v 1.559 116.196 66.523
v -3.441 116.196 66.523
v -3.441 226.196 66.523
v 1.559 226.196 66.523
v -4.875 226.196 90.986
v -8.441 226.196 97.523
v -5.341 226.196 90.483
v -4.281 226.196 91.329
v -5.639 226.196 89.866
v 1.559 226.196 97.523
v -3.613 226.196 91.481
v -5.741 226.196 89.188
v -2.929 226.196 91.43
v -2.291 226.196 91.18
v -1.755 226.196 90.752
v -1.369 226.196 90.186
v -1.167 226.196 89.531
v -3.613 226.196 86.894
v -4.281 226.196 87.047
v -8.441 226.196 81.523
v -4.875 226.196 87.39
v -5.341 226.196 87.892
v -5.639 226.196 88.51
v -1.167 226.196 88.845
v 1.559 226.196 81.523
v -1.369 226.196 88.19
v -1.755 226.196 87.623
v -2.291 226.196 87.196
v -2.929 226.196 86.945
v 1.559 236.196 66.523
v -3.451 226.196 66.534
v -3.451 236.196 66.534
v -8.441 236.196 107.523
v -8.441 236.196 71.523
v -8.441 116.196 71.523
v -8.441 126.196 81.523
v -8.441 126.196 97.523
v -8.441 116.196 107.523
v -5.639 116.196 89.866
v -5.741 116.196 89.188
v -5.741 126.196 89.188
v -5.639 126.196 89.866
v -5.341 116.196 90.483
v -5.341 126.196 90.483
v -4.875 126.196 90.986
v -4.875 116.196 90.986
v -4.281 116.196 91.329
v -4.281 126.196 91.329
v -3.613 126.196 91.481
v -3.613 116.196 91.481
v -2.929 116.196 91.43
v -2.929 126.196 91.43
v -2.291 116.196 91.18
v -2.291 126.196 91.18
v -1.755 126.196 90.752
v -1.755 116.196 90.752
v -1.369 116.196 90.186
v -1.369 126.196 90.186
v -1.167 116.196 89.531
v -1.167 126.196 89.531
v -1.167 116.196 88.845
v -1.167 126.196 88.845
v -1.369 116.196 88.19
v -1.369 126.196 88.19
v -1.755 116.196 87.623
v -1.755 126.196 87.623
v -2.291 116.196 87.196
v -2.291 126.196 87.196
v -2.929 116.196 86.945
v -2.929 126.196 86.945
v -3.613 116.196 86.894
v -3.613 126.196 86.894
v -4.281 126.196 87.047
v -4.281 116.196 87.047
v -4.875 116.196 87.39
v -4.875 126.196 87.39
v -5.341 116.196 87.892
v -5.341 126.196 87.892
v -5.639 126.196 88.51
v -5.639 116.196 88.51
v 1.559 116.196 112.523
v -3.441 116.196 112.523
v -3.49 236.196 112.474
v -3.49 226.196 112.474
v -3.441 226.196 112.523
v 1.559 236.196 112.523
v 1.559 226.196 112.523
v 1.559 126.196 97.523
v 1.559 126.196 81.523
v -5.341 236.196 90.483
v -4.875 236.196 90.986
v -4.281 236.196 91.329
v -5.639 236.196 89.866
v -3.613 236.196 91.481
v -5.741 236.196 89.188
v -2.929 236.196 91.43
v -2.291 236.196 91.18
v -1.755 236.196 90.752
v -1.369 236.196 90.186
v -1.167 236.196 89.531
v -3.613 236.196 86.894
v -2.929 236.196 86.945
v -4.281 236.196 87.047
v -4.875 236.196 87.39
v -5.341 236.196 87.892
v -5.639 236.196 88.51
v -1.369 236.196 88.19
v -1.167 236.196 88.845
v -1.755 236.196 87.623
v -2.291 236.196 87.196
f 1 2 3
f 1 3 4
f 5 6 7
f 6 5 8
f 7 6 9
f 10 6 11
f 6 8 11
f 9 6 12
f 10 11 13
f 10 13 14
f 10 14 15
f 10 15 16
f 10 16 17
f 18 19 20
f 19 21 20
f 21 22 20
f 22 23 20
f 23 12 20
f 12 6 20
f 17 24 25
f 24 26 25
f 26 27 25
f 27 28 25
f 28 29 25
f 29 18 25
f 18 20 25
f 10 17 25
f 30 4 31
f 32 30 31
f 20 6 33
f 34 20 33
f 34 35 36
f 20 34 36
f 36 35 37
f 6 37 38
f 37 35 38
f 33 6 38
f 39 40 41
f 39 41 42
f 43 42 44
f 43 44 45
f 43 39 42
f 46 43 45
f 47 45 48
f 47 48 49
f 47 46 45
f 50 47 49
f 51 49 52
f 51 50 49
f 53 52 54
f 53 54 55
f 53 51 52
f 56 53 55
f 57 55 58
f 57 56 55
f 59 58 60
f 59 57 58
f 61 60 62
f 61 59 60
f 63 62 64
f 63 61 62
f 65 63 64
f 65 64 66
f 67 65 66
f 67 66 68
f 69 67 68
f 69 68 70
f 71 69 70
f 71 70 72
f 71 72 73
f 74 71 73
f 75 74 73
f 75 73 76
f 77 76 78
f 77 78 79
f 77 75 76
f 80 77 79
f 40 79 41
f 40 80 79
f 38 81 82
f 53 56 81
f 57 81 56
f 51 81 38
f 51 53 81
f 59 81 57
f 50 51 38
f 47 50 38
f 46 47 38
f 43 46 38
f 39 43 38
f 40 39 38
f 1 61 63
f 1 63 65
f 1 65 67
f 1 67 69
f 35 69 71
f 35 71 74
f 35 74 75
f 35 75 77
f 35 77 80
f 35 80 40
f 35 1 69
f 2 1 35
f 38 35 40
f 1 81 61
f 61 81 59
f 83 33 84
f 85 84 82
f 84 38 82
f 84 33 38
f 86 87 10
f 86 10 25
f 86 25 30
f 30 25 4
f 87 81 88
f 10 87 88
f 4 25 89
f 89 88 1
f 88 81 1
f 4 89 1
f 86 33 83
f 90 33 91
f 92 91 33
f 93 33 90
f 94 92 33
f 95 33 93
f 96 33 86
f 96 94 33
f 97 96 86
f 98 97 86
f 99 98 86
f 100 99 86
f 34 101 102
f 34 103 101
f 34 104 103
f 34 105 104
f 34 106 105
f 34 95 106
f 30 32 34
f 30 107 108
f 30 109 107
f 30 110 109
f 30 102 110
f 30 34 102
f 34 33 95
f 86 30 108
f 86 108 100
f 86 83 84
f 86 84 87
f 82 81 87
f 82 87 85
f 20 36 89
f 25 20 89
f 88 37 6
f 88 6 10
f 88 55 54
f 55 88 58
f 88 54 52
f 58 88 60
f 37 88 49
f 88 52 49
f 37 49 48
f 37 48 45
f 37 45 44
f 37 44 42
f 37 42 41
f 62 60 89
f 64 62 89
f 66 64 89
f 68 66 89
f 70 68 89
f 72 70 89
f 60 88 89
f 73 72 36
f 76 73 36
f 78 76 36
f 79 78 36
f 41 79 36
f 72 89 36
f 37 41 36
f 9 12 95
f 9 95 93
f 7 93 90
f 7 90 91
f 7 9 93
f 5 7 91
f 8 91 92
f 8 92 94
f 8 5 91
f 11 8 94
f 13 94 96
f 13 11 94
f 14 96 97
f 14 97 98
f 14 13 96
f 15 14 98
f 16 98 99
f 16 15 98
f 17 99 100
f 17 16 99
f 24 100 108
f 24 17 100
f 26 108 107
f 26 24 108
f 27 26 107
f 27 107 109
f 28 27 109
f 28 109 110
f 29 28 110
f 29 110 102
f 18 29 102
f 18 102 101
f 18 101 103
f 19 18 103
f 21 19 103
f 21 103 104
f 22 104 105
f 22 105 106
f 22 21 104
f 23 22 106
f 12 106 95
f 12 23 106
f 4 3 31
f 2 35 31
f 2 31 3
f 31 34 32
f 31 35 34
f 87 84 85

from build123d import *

# Parameters (mm, degrees)
SKETCH_1_R      = 2.3
EXTRUDE_1_DEPTH = 10
SKETCH_2_W      = 10
SKETCH_2_H      = 15
EXTRUDE_2_DEPTH = 100
SKETCH_3_R      = 2.3
EXTRUDE_3_DEPTH = 10
CHAMFER_1_SIZE  = 5


with BuildPart() as part:
    # Эскиз1 → Бобышка-Вытянуть1 (new body)
    with BuildSketch(Plane(origin=(0, 116.195974268, 0), x_dir=(1, 0, 0), z_dir=(0, 1, 0))):
        Polygon((-8.441019306, -97.523129836), (-8.441019306, -81.523129836), (-8.441019306, -66.523129836), (1.558980694, -66.523129836), (1.558980694, -112.523129836), (-8.441019306, -112.523129836), align=None)
        with Locations(Location((-3.441019306, -89.187817333, 0), (0, 0, 180))):
            Circle(SKETCH_1_R, mode=Mode.SUBTRACT)
    extrude(amount=EXTRUDE_1_DEPTH)

    # Эскиз2 → Бобышка-Вытянуть2 (add)
    with BuildSketch(Plane(origin=(0, 126.195974268, 0), x_dir=(1, 0, 0), z_dir=(0, 1, 0))):
        with Locations((-3.441019306, -74.023129836)):
            Rectangle(SKETCH_2_W, SKETCH_2_H)
        with Locations((-3.441019306, -105.023129836)):
            Rectangle(SKETCH_2_W, SKETCH_2_H)
    extrude(amount=EXTRUDE_2_DEPTH)

    # Эскиз3 → Бобышка-Вытянуть3 (add)
    with BuildSketch(Plane(origin=(0, 226.195974268, 0), x_dir=(1, 0, 0), z_dir=(0, 1, 0))):
        Polygon((-8.441019306, -66.543886748), (-8.441019306, -112.425486731), (1.558980694, -112.523129836), (1.558980694, -66.523129836), align=None)
        with Locations(Location((-3.441019306, -89.187817333, 0), (0, 0, 180))):
            Circle(SKETCH_3_R, mode=Mode.SUBTRACT)
    extrude(amount=EXTRUDE_3_DEPTH)

    # Фаска1
    # the kernel refuses this chamfer: 5 mm, written as the material it takes off along each edge
    with BuildSketch(Plane(origin=(-8.441019306, 239.054389208, 66.523129836), x_dir=(-0.027495876610586625, 0, 0.9996219169112968), z_dir=(0, -1, 0)), Plane(origin=(-8.441019306, 103.337559328, 112.523129836), x_dir=(-0.027495876610585935, 0, -0.9996219169112968), z_dir=(0, 1, 0))) as chamfer_1_piece_1:
        Polygon((CHAMFER_1_SIZE * 0.999621916911, -CHAMFER_1_SIZE * 0.0274958766106), (-CHAMFER_1_SIZE * 0.0274958766106, -CHAMFER_1_SIZE * 0.999621916911), (0, 0), align=None)
    extrude(amount=135.71682988, mode=Mode.SUBTRACT)


solid = part.part
